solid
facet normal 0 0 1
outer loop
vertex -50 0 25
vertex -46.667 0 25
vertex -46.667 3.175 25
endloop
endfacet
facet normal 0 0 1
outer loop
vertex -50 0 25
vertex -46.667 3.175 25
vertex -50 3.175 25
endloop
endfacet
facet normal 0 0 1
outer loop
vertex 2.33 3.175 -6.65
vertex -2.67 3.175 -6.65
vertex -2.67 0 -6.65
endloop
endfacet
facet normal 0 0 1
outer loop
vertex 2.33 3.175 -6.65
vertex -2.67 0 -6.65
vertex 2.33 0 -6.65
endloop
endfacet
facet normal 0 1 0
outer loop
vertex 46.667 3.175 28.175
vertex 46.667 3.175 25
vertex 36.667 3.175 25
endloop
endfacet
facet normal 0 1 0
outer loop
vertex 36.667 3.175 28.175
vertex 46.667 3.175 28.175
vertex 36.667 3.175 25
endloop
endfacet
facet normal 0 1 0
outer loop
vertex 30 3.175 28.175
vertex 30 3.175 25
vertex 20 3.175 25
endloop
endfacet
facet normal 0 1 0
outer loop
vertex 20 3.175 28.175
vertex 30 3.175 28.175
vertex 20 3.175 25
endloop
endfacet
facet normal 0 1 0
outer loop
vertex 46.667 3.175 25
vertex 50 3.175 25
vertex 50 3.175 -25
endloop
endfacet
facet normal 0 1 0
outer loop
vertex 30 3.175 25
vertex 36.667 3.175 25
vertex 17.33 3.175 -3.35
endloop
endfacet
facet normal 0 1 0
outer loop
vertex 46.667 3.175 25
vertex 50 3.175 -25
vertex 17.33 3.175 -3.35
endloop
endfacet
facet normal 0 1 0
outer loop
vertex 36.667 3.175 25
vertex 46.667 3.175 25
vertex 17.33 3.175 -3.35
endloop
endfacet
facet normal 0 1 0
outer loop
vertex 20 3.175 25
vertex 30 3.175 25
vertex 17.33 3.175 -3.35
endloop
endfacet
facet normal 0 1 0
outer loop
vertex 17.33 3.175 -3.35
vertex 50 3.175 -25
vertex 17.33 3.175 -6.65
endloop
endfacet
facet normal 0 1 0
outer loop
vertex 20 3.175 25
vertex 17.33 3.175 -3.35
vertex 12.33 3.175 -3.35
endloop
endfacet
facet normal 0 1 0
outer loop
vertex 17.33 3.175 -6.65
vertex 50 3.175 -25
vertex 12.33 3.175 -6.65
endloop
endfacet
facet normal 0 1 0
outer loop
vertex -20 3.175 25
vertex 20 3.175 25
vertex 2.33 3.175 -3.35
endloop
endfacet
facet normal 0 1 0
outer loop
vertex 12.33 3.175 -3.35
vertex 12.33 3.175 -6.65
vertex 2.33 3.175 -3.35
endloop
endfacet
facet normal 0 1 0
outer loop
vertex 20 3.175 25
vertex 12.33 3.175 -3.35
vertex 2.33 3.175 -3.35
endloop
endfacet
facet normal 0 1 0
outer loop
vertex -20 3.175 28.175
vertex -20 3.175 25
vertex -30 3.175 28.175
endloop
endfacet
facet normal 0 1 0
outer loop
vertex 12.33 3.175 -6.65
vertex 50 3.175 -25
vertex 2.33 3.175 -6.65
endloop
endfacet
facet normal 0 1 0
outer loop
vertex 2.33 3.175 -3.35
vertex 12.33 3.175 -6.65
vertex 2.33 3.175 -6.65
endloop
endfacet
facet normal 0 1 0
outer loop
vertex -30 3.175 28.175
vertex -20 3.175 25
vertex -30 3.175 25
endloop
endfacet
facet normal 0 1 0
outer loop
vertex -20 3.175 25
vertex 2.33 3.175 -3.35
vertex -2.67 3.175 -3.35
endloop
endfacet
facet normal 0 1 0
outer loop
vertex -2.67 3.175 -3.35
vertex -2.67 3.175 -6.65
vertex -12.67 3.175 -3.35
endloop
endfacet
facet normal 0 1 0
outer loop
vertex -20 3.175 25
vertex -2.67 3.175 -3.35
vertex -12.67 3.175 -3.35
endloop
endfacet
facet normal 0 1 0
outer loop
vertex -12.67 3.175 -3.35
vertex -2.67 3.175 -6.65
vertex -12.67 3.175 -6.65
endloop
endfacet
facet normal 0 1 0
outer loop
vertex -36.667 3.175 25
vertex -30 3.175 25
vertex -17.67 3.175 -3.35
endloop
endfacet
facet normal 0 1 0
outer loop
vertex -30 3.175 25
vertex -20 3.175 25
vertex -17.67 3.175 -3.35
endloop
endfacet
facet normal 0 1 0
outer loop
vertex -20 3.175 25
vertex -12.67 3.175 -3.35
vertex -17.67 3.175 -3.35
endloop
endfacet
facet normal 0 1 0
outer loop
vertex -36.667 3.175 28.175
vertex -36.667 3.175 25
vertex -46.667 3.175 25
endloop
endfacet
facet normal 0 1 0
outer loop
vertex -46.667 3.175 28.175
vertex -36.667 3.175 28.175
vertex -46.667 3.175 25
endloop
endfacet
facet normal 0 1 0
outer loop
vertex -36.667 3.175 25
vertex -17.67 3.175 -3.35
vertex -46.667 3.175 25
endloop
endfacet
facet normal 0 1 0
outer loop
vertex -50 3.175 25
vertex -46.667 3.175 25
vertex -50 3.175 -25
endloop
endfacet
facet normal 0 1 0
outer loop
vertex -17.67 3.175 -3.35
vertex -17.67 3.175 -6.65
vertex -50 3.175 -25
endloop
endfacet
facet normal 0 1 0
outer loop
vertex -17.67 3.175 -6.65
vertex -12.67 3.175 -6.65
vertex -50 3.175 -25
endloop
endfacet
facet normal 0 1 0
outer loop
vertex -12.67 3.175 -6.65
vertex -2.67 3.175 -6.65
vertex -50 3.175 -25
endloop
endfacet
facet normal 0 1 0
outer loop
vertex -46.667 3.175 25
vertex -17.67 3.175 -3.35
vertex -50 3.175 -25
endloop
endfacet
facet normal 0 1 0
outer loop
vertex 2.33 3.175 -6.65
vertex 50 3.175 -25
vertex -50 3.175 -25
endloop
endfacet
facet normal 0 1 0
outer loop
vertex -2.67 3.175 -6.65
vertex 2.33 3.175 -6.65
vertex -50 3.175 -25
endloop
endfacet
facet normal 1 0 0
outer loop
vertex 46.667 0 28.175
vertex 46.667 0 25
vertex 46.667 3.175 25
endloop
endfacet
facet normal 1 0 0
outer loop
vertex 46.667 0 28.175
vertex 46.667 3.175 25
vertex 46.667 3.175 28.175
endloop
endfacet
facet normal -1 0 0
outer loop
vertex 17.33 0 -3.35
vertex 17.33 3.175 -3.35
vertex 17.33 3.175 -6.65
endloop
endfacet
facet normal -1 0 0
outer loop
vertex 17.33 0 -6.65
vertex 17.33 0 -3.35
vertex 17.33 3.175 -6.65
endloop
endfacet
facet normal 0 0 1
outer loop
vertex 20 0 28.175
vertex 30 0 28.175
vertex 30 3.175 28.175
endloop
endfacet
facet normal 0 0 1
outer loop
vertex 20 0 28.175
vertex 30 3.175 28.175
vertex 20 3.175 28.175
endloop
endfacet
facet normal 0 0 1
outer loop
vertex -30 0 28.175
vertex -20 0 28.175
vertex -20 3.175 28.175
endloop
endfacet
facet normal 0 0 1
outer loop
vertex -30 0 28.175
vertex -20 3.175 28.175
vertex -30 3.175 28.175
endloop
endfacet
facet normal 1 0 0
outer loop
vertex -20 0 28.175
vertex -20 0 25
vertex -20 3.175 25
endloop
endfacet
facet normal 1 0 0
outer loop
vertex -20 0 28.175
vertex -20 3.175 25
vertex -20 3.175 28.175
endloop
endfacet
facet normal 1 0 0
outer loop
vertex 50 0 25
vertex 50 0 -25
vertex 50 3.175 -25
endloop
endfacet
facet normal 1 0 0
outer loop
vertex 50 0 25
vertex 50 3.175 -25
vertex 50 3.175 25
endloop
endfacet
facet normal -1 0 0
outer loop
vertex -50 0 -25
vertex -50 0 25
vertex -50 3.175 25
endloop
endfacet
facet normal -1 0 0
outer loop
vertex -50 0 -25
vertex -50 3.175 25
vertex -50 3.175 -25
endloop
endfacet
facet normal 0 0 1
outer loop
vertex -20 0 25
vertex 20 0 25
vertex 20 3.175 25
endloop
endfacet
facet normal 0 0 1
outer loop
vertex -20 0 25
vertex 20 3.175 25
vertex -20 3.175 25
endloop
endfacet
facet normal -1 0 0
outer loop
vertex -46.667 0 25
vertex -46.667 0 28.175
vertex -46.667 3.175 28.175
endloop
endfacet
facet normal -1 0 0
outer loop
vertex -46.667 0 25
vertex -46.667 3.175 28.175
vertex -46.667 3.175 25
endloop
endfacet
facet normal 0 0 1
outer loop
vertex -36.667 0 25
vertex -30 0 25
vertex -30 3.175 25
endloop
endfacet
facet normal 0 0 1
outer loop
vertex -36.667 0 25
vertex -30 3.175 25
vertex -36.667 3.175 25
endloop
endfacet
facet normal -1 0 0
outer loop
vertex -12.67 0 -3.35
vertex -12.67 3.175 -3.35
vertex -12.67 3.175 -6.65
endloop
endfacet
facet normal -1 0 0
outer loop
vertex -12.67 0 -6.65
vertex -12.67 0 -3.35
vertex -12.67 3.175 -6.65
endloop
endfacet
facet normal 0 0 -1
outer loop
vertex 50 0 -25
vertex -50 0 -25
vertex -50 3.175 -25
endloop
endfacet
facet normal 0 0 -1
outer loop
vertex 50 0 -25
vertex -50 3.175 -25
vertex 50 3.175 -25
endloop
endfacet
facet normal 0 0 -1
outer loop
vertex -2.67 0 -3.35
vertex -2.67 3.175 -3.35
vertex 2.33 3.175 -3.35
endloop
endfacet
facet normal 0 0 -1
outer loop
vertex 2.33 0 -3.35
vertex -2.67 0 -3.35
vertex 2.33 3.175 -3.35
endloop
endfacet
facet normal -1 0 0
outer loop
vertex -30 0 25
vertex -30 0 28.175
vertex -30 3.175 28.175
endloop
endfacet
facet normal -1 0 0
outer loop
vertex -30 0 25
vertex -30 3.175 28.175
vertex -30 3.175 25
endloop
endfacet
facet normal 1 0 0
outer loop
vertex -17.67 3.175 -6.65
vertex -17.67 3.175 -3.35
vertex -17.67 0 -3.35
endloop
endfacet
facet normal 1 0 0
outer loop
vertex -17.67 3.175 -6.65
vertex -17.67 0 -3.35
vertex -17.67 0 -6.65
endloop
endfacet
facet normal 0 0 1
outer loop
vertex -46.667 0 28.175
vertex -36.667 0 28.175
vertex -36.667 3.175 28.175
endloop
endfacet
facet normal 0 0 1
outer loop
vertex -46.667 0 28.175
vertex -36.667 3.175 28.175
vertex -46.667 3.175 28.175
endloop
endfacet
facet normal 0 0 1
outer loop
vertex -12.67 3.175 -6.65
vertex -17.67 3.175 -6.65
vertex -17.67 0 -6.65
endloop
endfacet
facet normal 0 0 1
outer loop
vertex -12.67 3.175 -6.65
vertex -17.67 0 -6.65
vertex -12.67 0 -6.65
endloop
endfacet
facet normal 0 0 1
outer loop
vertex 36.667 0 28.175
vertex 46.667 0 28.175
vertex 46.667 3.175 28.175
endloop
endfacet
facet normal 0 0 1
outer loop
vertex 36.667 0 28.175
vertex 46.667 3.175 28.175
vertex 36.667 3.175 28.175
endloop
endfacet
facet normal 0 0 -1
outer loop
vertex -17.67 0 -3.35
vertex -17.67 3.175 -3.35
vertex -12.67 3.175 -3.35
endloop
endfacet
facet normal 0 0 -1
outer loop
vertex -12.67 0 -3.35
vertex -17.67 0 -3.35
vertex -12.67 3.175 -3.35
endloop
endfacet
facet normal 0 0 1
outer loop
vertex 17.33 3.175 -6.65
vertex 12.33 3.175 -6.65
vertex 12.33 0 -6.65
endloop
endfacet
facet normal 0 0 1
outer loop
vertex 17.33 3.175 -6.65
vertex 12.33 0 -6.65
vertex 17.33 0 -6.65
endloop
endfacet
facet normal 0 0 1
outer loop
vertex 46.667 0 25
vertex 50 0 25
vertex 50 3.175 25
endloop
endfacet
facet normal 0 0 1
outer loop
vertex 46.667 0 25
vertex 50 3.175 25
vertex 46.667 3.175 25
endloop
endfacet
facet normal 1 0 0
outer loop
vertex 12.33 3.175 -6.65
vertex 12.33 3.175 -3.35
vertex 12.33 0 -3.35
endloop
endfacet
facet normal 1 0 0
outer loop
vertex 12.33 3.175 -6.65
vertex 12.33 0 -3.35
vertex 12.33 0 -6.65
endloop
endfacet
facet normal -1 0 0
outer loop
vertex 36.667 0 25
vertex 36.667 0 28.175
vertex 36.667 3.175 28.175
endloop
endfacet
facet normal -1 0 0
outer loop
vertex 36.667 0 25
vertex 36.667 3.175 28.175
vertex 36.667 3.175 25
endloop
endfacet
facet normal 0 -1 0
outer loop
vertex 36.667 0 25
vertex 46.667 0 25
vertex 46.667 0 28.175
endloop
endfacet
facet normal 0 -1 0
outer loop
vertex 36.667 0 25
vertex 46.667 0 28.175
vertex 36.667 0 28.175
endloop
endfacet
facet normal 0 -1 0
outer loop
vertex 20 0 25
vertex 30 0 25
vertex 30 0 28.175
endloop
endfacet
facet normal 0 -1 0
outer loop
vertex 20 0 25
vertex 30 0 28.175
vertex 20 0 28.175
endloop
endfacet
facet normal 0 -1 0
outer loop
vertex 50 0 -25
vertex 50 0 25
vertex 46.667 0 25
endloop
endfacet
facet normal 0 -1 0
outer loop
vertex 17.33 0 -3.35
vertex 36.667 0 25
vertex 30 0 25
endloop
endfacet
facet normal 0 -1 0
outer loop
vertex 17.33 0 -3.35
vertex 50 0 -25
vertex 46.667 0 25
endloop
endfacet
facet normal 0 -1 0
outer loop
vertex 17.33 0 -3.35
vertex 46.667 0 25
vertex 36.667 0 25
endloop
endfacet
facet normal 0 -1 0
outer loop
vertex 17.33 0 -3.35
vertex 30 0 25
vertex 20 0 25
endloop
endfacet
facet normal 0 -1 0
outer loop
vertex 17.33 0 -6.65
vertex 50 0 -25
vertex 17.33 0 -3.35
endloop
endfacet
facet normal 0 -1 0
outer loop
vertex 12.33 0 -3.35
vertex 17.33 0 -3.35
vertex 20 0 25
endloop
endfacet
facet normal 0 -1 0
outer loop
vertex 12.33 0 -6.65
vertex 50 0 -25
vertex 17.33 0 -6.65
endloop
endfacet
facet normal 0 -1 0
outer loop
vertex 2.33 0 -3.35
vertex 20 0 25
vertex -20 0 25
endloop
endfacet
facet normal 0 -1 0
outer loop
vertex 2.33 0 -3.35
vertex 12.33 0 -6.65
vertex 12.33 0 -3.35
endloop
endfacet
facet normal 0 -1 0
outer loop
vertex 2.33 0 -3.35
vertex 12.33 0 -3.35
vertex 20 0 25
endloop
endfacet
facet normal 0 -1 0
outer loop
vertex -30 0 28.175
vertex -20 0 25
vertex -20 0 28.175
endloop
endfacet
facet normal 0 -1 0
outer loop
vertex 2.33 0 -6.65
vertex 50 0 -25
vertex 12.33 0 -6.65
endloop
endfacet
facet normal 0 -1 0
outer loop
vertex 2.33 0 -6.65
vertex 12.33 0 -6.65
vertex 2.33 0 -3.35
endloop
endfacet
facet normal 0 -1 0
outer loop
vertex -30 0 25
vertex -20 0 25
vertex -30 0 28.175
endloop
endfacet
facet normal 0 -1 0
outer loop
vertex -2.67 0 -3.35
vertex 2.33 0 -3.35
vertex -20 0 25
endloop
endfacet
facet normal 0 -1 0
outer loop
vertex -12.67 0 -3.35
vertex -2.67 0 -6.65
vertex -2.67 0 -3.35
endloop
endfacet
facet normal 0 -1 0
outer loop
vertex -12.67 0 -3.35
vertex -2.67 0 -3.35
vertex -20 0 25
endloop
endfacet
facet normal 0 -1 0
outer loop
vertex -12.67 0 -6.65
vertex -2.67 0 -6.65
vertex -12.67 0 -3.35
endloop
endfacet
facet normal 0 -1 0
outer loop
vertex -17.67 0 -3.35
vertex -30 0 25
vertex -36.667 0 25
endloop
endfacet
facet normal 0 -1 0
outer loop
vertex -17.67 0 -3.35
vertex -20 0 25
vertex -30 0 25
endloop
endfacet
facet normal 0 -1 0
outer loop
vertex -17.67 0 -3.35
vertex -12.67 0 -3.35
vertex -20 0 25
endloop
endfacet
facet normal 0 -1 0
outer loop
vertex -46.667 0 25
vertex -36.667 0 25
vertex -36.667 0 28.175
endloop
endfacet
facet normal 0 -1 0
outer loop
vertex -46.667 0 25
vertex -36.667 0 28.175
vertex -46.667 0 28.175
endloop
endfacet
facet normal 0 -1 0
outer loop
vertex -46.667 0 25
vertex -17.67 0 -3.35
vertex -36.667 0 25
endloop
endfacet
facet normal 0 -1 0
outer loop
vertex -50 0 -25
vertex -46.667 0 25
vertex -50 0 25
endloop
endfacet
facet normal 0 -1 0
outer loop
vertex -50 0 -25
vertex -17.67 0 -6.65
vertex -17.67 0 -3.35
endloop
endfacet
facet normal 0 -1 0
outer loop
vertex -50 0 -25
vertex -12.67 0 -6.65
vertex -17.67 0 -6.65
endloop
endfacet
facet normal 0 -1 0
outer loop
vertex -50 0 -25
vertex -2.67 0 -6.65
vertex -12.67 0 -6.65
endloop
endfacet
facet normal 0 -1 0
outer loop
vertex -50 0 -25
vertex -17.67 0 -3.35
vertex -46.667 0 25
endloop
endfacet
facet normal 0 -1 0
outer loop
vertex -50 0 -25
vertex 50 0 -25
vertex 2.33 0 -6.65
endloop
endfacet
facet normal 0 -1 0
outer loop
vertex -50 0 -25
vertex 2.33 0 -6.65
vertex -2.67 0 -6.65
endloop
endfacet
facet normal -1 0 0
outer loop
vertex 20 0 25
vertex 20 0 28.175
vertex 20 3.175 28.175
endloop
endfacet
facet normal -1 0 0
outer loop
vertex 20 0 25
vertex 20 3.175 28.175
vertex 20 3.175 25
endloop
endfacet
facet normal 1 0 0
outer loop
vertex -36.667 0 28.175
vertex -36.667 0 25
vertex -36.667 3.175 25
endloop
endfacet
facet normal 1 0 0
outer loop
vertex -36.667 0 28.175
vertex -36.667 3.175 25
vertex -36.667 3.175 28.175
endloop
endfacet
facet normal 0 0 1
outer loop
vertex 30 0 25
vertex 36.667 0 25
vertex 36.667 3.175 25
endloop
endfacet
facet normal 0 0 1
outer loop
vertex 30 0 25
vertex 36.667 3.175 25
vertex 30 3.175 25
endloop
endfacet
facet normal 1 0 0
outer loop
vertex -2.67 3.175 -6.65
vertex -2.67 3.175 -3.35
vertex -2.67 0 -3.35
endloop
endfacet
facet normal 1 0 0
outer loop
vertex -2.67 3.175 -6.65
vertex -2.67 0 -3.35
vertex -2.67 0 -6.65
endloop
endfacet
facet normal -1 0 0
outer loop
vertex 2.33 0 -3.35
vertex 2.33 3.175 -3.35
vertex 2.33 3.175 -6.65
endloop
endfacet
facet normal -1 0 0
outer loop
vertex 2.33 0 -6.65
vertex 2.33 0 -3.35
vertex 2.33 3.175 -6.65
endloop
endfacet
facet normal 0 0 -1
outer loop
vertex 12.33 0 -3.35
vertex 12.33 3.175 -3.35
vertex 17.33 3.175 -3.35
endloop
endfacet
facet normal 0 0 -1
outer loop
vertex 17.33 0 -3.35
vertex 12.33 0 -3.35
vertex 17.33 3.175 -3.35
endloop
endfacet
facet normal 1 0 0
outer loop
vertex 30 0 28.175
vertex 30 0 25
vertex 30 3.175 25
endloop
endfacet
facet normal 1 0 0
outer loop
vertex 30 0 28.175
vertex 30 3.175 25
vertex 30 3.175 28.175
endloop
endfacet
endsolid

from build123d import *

# Parameters (mm, degrees)
BOSS_EXTRUDE1_DEPTH = 3.175
SKETCH2_W           = 5
SKETCH2_H           = 3.3
CUT_EXTRUDE1_DEPTH  = 3.175


with BuildPart() as part:
    # Sketch1 → Boss-Extrude1 (new body)
    with BuildSketch(Plane(origin=(0, 0, 0), x_dir=(1, 0, 0), z_dir=(0, 1, 0))):
        Polygon((-50, 25), (50, 25), (50, -25), (46.666666667, -25), (46.666666667, -28.175), (36.666666667, -28.175), (36.666666667, -25), (30, -25), (30, -28.175), (20, -28.175), (20, -25), (-20, -25), (-20, -28.175), (-30, -28.175), (-30, -25), (-36.666666667, -25), (-36.666666667, -28.175), (-46.666666667, -28.175), (-46.666666667, -25), (-50, -25), align=None)
    extrude(amount=BOSS_EXTRUDE1_DEPTH)

    # Sketch2 → Cut-Extrude1 (cut)
    with BuildSketch(Plane(origin=(0, 3.175, 0), x_dir=(1, 0, 0), z_dir=(0, 1, 0))):
        with Locations((-0.169597497, 5)):
            Rectangle(SKETCH2_W, SKETCH2_H)
        with Locations((-15.169597497, 5)):
            Rectangle(SKETCH2_W, SKETCH2_H)
        with Locations((14.830402503, 5)):
            Rectangle(SKETCH2_W, SKETCH2_H)
    extrude(amount=-CUT_EXTRUDE1_DEPTH, mode=Mode.SUBTRACT)


solid = part.part
